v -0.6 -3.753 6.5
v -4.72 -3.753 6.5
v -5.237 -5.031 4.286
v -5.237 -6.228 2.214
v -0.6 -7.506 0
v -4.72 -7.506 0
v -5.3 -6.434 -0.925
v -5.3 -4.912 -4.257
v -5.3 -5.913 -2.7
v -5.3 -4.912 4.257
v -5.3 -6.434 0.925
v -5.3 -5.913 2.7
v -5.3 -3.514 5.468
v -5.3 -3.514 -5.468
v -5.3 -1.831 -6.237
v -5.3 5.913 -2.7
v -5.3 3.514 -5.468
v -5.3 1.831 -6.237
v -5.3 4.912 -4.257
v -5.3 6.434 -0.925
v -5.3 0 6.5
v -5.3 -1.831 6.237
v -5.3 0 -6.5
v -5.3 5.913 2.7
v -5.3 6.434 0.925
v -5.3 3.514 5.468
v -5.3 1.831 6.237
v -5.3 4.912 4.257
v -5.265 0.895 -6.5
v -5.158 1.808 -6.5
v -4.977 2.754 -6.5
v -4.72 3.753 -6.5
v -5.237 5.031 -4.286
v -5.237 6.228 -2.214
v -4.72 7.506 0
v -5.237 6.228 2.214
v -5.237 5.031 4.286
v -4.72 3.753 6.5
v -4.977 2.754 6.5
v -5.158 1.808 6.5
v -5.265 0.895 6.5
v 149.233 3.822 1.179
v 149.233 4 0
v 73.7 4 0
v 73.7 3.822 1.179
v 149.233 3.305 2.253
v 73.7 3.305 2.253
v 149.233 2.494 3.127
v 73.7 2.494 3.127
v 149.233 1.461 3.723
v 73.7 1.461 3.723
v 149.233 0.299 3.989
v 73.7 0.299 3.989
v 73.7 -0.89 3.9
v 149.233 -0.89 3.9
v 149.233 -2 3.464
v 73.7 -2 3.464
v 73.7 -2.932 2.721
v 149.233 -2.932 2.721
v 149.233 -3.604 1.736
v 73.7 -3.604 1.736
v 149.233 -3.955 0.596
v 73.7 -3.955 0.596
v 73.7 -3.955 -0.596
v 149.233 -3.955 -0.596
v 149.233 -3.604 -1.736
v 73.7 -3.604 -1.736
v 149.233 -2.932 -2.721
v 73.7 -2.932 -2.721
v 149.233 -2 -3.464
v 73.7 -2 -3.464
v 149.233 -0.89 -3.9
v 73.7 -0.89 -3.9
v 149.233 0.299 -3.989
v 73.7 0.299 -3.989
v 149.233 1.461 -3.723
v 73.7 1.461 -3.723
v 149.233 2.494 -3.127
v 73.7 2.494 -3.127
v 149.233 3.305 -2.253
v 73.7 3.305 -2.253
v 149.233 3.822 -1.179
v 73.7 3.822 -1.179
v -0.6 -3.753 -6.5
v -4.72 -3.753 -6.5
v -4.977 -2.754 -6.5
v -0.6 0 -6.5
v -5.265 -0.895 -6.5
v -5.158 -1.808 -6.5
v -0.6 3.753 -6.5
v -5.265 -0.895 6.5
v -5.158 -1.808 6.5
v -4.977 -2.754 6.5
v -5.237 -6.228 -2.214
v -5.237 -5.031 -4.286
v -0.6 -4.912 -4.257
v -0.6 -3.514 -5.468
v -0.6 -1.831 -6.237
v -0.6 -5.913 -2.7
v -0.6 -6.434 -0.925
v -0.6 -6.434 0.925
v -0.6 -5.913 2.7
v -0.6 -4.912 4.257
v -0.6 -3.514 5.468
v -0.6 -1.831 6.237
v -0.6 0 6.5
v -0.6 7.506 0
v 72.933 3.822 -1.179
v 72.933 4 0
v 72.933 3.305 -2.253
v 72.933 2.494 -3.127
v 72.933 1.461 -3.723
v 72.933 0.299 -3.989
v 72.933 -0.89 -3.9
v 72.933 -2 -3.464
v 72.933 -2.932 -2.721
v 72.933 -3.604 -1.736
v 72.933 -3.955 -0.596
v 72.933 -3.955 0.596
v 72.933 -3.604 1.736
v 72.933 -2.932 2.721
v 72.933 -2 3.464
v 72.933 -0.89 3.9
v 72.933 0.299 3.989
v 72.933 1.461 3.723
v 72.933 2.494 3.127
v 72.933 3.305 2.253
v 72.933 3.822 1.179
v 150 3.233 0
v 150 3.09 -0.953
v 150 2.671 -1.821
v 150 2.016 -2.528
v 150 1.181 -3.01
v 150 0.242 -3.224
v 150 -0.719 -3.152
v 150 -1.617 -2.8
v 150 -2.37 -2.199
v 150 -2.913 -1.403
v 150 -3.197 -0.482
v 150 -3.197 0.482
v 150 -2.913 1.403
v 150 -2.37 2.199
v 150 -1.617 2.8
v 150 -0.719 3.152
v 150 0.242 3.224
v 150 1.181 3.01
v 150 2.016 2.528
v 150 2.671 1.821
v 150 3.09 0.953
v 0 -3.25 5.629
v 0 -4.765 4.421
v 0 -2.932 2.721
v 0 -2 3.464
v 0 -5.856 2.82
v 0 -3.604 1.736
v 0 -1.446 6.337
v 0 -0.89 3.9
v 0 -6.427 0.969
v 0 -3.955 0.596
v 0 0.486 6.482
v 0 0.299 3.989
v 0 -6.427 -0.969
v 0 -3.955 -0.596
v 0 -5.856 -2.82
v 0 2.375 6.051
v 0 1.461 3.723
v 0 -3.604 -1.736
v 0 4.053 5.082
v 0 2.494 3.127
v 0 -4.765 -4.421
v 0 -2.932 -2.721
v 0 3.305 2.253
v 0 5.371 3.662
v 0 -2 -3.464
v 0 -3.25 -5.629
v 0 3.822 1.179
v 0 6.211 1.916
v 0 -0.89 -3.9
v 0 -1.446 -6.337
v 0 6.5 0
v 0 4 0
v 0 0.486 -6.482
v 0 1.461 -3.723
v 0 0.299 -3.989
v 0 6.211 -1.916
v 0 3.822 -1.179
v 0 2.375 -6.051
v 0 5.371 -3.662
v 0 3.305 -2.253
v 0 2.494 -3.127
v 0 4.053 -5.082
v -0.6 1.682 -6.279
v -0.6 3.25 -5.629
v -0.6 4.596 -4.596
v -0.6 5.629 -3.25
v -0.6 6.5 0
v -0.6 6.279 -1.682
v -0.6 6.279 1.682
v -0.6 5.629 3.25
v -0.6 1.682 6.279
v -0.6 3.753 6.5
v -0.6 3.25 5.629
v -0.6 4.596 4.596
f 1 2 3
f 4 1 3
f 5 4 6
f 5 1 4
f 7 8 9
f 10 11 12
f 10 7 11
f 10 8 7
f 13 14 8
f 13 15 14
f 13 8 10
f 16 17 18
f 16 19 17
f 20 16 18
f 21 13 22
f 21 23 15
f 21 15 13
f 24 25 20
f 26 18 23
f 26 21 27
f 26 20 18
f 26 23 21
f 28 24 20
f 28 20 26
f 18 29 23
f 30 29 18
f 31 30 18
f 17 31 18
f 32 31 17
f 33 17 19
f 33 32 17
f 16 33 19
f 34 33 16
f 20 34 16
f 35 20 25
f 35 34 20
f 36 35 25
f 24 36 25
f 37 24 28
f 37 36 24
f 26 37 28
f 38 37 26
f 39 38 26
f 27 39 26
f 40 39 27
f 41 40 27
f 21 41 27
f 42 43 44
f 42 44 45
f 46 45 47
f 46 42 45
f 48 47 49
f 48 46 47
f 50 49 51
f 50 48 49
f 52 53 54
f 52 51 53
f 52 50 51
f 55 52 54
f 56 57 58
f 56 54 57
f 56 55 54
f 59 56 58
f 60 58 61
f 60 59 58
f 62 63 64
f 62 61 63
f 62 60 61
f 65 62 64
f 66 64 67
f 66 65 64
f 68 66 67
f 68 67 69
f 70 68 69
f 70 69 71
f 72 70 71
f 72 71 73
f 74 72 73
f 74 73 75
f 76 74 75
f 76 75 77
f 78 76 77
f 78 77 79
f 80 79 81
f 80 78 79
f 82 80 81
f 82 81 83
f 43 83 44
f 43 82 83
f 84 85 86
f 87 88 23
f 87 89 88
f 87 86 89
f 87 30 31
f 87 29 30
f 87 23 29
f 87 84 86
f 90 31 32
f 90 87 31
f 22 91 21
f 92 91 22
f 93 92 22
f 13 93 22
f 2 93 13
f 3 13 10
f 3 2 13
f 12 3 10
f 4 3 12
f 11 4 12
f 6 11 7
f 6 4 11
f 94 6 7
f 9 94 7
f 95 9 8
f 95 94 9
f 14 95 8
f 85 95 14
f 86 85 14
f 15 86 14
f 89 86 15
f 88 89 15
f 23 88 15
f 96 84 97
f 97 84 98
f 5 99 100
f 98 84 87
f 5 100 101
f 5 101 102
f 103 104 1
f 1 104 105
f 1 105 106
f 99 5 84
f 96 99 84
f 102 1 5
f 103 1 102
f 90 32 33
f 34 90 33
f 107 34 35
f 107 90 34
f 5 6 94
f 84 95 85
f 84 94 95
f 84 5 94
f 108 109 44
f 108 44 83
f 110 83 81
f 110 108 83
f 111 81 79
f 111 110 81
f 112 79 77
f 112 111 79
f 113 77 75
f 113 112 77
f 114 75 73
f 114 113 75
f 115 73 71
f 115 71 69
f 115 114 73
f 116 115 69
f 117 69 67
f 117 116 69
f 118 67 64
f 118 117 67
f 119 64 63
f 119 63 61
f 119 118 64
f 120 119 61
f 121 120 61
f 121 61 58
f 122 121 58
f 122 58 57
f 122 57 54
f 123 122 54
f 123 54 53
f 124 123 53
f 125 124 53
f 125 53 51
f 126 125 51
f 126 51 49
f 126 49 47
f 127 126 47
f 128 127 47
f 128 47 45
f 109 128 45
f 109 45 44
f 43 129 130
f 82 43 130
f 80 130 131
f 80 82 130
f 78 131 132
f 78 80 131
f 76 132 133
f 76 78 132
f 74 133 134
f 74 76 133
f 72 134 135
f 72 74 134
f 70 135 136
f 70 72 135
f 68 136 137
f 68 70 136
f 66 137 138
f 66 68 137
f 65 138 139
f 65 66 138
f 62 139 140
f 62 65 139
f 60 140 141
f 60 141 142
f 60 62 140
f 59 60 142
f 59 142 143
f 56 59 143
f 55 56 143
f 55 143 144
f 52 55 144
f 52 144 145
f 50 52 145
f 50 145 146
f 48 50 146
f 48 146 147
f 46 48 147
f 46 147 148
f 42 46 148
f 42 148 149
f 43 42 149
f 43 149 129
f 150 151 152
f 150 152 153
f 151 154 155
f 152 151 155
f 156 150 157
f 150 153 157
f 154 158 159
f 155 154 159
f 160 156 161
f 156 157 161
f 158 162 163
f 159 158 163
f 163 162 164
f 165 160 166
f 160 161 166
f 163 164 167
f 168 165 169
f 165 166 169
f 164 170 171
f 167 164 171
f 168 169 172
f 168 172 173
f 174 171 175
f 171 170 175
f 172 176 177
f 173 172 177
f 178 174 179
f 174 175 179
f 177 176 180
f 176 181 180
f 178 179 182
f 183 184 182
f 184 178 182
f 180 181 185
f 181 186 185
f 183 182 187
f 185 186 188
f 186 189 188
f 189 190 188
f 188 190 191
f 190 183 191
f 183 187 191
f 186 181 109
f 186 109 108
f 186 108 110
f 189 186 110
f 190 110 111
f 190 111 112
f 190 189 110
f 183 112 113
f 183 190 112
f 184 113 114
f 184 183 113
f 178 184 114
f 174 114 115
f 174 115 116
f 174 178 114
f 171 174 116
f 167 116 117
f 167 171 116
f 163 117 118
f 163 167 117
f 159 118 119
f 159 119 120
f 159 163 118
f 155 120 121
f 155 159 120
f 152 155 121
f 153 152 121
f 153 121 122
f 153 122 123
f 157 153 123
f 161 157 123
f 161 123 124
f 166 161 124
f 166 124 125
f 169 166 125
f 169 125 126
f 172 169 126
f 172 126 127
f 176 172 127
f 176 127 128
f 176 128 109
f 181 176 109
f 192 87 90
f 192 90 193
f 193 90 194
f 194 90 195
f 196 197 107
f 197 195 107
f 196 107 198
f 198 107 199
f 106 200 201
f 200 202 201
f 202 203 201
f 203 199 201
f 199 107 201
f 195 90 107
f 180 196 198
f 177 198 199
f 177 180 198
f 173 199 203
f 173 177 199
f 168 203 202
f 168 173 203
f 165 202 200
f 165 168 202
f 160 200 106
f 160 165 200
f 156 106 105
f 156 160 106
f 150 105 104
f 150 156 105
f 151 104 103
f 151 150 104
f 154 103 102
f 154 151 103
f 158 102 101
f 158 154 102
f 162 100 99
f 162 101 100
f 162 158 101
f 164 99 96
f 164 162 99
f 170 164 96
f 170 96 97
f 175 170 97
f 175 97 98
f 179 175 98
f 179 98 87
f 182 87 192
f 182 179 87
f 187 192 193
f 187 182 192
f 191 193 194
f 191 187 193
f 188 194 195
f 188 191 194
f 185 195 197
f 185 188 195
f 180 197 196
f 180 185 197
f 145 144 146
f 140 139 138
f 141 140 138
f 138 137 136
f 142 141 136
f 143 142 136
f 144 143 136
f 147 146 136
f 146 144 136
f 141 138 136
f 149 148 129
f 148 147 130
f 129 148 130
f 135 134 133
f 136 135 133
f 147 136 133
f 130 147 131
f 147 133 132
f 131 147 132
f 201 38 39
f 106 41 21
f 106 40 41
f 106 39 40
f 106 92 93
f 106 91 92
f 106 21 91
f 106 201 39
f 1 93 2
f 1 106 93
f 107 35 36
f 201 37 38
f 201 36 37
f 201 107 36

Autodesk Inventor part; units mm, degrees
ref_plane "YZ Plane" through (0, 0, 0) normal (1, 0, 0) x (0, 1, 0)
ref_plane "XZ Plane" through (0, 0, 0) normal (0, 1, 0) x (-1, 0, 0)
sketch "Sketch1" plane through (0, 0, 0) normal (0, 0, 1) x (1, 0, 0)
  line L0 (0, 6.5) -> (0, 4)
  line L1 (73.7, 4) -> (150, 4)
  line L2 (150, 4) -> (150, 0)
  line L3 (150, 0) -> (-0.6001, 0)
  line L4 (-30.7201, 0) -> (180.12, 0) projected
  line L5 (-0.6001, 0) -> (-0.6001, 6.5)
  line L6 (-0.6001, 6.5) -> (0, 6.5)
  line L7 (73.7, 4) -> (72.9331, 4)
  line L8 (72.9331, 4) -> (0, 4)
  line L9 (0, -1.3) -> (0, 7.8) projected
  dimension "d0" = 150
  dimension "d1" = 76.3
  dimension "d2" = 8
  dimension "d9" = 0.6001
  dimension "d10" = 13
  dimension "d13" = 0.7669
  dimension "d14" = 8
revolve "Body" add sketch "Sketch1" angle 360 about axis through (150, 0, 0) along (-1, 0, 0)
sketch "Sketch2" plane through (-0.6001, 0, 0) normal (-1, 0, 0) x (0, 0, 1)
  line L0 (0, 7.5056) -> (6.5, 3.7528)
  line L1 (6.5, 3.7528) -> (6.5, -3.7528)
  line L2 (6.5, -3.7528) -> (0, -7.5056)
  line L3 (0, -7.5056) -> (-6.5, -3.7528)
  line L4 (-6.5, -3.7528) -> (-6.5, 3.7528)
  line L5 (-6.5, 3.7528) -> (0, 7.5056)
  point P0 (0, 0)
  point P1 (0, 0)
  dimension "d11" = 13
extrude "Head" add sketch "Sketch2" along normal blind 4.7
sketch "Sketch4" plane through (0, 0, 0) normal (0, 0, 1) x (1, 0, 0)
  line L0 (-5.3001, 6.5) -> (-5.3001, 7.5056)
  line L1 (-5.3001, 7.5056) -> (-4.7195, 7.5056)
  line L2 (-4.7195, 7.5056) -> (-5.3001, 6.5)
  line L3 (-6.2401, 0) -> (0.3399, 0) projected
  line L4 (-0.6001, 7.5056) -> (-5.3001, 7.5056) projected
  line L5 (-5.3001, 3.7528) -> (-5.3001, 7.5056) projected
  dimension "d5" = 30
  dimension "d19" = 13
revolve "Chamfer1" cut sketch "Sketch4" angle 360 about axis through (-10, 0, 0) along (1, 0, 0)
thread "Thread" size "M8x1.25" class "6g" standard "ISO Metric profile" length 76.3
chamfer "Chamfer2" distance 0.7668 distance2 0.7669 1 edges at (150, -4, 0) measured on face at (150, 0.998, -0.8842)
ref_plane "Work Plane1" through (1.525, 0, 0) normal (0, 0, 1) x (1, 0, 0)
equation "\"d1\" = GEL"
equation "\"d2\" = GD"
equation "\"d10\" = SD2"
equation "\"d14\" = BDM"
equation "\"d11\" = SW"
equation "\"d3\" = KOH - SD"
equation "\"d5\" = ANG1"
equation "\"d19\" = SW0"
equation "\"d15\" = GEL"
equation "\"d6\" = -0.5 * SPD + 0.5 * GD"
equation "\"GD\" = NND"
equation "\"BDM\" = NND"
equation "\"KOH\" = 5.3"
equation "\"GEL\" = 76.3"
equation "\"SW\" = 13"
equation "\"SW0\" = SW"
equation "\"SPD\" = NND - 1.2269 * PTC"
equation "\"SD2\" = SW"
equation "\"SD\" = 0.6"
equation "\"ANG1\" = 30deg"
equation "\"GAL\" = 0.61345 * PTC"
equation "\"GUL\" = 0.61345 * PTC"
equation "\"RR\" = 0.4"
equation "\"WFT\" = SD"
equation "\"GD1\" = THREADDIA - 1.2269 * PTC"
equation "\"THREADDIA\" = 8"
equation "\"SDH\" = SW"
equation "\"TOA\" = 30deg"
equation "\"FAWI\" = 45deg"
equation "\"PTC\" = 1.25"
equation "\"NND\" = 8"
equation "\"E0\" = 1.155 * SW"
properties part number "AS 1110 - M8 x 80" material "Steel, Mild"
